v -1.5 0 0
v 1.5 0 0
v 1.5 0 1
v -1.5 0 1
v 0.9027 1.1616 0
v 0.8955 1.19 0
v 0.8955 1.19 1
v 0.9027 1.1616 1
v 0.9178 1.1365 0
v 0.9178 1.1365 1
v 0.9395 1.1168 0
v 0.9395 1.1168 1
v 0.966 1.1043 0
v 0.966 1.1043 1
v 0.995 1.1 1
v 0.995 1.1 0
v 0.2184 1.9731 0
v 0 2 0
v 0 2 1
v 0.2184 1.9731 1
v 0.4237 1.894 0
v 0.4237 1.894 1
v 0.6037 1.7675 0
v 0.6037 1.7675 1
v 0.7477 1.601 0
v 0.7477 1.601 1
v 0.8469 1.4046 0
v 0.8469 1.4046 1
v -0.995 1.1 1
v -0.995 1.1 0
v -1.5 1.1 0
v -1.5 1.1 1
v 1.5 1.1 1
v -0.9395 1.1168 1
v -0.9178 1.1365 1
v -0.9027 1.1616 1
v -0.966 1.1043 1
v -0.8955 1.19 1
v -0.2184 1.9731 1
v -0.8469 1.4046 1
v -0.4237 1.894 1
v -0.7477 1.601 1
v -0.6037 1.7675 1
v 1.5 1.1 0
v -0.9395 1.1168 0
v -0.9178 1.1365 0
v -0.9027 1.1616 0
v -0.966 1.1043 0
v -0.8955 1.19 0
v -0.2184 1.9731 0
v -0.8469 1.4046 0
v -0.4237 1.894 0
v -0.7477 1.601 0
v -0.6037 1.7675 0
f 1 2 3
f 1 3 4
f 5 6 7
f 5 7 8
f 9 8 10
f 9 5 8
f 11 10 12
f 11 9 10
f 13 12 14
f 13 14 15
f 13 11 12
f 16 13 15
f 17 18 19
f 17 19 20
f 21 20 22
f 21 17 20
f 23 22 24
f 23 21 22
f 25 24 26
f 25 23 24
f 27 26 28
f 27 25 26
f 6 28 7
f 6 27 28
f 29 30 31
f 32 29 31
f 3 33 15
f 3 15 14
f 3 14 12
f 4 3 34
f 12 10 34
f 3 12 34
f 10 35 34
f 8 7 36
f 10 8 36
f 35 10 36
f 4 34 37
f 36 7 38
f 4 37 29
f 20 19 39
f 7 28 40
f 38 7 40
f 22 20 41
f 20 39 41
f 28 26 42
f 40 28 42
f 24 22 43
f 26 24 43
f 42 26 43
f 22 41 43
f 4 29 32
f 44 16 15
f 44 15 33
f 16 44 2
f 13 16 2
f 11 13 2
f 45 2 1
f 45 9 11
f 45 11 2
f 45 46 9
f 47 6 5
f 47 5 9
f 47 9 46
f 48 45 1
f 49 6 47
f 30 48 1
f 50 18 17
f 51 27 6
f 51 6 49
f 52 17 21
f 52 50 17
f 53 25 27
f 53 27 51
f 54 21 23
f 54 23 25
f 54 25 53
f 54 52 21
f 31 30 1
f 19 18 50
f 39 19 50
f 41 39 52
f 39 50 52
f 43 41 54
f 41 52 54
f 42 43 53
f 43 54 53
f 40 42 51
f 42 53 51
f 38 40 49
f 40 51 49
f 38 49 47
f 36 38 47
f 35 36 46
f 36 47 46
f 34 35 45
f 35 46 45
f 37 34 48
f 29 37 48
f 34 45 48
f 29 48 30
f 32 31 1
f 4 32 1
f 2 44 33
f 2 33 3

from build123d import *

# Parameters (mm, degrees)
F1_DEPTH = 1


with BuildPart() as f1:
    # F0 (on Top) → F1 (new body)
    with BuildSketch(Plane.XY):
        with BuildLine():
            Line((-1.5, 0), (0, 0))
            Line((0, 0), (0, 1.1))
            Line((0, 1.1), (0, 2))
            ThreePointArc((0, 2), (-0.603738, 1.767458), (-0.895489, 1.19))
            ThreePointArc((-0.895489, 1.19), (-0.927905, 1.125838), (-0.994987, 1.1))
            Line((-0.994987, 1.1), (-1.5, 1.1))
            Line((-1.5, 1.1), (-1.5, 0))
        make_face()
    extrude(amount=F1_DEPTH)

    # F2: F1 across plane


with BuildPart() as f1_1:
    add(f1.part)
    add(f1.part.mirror(Plane.YZ))


solid = f1_1.part
